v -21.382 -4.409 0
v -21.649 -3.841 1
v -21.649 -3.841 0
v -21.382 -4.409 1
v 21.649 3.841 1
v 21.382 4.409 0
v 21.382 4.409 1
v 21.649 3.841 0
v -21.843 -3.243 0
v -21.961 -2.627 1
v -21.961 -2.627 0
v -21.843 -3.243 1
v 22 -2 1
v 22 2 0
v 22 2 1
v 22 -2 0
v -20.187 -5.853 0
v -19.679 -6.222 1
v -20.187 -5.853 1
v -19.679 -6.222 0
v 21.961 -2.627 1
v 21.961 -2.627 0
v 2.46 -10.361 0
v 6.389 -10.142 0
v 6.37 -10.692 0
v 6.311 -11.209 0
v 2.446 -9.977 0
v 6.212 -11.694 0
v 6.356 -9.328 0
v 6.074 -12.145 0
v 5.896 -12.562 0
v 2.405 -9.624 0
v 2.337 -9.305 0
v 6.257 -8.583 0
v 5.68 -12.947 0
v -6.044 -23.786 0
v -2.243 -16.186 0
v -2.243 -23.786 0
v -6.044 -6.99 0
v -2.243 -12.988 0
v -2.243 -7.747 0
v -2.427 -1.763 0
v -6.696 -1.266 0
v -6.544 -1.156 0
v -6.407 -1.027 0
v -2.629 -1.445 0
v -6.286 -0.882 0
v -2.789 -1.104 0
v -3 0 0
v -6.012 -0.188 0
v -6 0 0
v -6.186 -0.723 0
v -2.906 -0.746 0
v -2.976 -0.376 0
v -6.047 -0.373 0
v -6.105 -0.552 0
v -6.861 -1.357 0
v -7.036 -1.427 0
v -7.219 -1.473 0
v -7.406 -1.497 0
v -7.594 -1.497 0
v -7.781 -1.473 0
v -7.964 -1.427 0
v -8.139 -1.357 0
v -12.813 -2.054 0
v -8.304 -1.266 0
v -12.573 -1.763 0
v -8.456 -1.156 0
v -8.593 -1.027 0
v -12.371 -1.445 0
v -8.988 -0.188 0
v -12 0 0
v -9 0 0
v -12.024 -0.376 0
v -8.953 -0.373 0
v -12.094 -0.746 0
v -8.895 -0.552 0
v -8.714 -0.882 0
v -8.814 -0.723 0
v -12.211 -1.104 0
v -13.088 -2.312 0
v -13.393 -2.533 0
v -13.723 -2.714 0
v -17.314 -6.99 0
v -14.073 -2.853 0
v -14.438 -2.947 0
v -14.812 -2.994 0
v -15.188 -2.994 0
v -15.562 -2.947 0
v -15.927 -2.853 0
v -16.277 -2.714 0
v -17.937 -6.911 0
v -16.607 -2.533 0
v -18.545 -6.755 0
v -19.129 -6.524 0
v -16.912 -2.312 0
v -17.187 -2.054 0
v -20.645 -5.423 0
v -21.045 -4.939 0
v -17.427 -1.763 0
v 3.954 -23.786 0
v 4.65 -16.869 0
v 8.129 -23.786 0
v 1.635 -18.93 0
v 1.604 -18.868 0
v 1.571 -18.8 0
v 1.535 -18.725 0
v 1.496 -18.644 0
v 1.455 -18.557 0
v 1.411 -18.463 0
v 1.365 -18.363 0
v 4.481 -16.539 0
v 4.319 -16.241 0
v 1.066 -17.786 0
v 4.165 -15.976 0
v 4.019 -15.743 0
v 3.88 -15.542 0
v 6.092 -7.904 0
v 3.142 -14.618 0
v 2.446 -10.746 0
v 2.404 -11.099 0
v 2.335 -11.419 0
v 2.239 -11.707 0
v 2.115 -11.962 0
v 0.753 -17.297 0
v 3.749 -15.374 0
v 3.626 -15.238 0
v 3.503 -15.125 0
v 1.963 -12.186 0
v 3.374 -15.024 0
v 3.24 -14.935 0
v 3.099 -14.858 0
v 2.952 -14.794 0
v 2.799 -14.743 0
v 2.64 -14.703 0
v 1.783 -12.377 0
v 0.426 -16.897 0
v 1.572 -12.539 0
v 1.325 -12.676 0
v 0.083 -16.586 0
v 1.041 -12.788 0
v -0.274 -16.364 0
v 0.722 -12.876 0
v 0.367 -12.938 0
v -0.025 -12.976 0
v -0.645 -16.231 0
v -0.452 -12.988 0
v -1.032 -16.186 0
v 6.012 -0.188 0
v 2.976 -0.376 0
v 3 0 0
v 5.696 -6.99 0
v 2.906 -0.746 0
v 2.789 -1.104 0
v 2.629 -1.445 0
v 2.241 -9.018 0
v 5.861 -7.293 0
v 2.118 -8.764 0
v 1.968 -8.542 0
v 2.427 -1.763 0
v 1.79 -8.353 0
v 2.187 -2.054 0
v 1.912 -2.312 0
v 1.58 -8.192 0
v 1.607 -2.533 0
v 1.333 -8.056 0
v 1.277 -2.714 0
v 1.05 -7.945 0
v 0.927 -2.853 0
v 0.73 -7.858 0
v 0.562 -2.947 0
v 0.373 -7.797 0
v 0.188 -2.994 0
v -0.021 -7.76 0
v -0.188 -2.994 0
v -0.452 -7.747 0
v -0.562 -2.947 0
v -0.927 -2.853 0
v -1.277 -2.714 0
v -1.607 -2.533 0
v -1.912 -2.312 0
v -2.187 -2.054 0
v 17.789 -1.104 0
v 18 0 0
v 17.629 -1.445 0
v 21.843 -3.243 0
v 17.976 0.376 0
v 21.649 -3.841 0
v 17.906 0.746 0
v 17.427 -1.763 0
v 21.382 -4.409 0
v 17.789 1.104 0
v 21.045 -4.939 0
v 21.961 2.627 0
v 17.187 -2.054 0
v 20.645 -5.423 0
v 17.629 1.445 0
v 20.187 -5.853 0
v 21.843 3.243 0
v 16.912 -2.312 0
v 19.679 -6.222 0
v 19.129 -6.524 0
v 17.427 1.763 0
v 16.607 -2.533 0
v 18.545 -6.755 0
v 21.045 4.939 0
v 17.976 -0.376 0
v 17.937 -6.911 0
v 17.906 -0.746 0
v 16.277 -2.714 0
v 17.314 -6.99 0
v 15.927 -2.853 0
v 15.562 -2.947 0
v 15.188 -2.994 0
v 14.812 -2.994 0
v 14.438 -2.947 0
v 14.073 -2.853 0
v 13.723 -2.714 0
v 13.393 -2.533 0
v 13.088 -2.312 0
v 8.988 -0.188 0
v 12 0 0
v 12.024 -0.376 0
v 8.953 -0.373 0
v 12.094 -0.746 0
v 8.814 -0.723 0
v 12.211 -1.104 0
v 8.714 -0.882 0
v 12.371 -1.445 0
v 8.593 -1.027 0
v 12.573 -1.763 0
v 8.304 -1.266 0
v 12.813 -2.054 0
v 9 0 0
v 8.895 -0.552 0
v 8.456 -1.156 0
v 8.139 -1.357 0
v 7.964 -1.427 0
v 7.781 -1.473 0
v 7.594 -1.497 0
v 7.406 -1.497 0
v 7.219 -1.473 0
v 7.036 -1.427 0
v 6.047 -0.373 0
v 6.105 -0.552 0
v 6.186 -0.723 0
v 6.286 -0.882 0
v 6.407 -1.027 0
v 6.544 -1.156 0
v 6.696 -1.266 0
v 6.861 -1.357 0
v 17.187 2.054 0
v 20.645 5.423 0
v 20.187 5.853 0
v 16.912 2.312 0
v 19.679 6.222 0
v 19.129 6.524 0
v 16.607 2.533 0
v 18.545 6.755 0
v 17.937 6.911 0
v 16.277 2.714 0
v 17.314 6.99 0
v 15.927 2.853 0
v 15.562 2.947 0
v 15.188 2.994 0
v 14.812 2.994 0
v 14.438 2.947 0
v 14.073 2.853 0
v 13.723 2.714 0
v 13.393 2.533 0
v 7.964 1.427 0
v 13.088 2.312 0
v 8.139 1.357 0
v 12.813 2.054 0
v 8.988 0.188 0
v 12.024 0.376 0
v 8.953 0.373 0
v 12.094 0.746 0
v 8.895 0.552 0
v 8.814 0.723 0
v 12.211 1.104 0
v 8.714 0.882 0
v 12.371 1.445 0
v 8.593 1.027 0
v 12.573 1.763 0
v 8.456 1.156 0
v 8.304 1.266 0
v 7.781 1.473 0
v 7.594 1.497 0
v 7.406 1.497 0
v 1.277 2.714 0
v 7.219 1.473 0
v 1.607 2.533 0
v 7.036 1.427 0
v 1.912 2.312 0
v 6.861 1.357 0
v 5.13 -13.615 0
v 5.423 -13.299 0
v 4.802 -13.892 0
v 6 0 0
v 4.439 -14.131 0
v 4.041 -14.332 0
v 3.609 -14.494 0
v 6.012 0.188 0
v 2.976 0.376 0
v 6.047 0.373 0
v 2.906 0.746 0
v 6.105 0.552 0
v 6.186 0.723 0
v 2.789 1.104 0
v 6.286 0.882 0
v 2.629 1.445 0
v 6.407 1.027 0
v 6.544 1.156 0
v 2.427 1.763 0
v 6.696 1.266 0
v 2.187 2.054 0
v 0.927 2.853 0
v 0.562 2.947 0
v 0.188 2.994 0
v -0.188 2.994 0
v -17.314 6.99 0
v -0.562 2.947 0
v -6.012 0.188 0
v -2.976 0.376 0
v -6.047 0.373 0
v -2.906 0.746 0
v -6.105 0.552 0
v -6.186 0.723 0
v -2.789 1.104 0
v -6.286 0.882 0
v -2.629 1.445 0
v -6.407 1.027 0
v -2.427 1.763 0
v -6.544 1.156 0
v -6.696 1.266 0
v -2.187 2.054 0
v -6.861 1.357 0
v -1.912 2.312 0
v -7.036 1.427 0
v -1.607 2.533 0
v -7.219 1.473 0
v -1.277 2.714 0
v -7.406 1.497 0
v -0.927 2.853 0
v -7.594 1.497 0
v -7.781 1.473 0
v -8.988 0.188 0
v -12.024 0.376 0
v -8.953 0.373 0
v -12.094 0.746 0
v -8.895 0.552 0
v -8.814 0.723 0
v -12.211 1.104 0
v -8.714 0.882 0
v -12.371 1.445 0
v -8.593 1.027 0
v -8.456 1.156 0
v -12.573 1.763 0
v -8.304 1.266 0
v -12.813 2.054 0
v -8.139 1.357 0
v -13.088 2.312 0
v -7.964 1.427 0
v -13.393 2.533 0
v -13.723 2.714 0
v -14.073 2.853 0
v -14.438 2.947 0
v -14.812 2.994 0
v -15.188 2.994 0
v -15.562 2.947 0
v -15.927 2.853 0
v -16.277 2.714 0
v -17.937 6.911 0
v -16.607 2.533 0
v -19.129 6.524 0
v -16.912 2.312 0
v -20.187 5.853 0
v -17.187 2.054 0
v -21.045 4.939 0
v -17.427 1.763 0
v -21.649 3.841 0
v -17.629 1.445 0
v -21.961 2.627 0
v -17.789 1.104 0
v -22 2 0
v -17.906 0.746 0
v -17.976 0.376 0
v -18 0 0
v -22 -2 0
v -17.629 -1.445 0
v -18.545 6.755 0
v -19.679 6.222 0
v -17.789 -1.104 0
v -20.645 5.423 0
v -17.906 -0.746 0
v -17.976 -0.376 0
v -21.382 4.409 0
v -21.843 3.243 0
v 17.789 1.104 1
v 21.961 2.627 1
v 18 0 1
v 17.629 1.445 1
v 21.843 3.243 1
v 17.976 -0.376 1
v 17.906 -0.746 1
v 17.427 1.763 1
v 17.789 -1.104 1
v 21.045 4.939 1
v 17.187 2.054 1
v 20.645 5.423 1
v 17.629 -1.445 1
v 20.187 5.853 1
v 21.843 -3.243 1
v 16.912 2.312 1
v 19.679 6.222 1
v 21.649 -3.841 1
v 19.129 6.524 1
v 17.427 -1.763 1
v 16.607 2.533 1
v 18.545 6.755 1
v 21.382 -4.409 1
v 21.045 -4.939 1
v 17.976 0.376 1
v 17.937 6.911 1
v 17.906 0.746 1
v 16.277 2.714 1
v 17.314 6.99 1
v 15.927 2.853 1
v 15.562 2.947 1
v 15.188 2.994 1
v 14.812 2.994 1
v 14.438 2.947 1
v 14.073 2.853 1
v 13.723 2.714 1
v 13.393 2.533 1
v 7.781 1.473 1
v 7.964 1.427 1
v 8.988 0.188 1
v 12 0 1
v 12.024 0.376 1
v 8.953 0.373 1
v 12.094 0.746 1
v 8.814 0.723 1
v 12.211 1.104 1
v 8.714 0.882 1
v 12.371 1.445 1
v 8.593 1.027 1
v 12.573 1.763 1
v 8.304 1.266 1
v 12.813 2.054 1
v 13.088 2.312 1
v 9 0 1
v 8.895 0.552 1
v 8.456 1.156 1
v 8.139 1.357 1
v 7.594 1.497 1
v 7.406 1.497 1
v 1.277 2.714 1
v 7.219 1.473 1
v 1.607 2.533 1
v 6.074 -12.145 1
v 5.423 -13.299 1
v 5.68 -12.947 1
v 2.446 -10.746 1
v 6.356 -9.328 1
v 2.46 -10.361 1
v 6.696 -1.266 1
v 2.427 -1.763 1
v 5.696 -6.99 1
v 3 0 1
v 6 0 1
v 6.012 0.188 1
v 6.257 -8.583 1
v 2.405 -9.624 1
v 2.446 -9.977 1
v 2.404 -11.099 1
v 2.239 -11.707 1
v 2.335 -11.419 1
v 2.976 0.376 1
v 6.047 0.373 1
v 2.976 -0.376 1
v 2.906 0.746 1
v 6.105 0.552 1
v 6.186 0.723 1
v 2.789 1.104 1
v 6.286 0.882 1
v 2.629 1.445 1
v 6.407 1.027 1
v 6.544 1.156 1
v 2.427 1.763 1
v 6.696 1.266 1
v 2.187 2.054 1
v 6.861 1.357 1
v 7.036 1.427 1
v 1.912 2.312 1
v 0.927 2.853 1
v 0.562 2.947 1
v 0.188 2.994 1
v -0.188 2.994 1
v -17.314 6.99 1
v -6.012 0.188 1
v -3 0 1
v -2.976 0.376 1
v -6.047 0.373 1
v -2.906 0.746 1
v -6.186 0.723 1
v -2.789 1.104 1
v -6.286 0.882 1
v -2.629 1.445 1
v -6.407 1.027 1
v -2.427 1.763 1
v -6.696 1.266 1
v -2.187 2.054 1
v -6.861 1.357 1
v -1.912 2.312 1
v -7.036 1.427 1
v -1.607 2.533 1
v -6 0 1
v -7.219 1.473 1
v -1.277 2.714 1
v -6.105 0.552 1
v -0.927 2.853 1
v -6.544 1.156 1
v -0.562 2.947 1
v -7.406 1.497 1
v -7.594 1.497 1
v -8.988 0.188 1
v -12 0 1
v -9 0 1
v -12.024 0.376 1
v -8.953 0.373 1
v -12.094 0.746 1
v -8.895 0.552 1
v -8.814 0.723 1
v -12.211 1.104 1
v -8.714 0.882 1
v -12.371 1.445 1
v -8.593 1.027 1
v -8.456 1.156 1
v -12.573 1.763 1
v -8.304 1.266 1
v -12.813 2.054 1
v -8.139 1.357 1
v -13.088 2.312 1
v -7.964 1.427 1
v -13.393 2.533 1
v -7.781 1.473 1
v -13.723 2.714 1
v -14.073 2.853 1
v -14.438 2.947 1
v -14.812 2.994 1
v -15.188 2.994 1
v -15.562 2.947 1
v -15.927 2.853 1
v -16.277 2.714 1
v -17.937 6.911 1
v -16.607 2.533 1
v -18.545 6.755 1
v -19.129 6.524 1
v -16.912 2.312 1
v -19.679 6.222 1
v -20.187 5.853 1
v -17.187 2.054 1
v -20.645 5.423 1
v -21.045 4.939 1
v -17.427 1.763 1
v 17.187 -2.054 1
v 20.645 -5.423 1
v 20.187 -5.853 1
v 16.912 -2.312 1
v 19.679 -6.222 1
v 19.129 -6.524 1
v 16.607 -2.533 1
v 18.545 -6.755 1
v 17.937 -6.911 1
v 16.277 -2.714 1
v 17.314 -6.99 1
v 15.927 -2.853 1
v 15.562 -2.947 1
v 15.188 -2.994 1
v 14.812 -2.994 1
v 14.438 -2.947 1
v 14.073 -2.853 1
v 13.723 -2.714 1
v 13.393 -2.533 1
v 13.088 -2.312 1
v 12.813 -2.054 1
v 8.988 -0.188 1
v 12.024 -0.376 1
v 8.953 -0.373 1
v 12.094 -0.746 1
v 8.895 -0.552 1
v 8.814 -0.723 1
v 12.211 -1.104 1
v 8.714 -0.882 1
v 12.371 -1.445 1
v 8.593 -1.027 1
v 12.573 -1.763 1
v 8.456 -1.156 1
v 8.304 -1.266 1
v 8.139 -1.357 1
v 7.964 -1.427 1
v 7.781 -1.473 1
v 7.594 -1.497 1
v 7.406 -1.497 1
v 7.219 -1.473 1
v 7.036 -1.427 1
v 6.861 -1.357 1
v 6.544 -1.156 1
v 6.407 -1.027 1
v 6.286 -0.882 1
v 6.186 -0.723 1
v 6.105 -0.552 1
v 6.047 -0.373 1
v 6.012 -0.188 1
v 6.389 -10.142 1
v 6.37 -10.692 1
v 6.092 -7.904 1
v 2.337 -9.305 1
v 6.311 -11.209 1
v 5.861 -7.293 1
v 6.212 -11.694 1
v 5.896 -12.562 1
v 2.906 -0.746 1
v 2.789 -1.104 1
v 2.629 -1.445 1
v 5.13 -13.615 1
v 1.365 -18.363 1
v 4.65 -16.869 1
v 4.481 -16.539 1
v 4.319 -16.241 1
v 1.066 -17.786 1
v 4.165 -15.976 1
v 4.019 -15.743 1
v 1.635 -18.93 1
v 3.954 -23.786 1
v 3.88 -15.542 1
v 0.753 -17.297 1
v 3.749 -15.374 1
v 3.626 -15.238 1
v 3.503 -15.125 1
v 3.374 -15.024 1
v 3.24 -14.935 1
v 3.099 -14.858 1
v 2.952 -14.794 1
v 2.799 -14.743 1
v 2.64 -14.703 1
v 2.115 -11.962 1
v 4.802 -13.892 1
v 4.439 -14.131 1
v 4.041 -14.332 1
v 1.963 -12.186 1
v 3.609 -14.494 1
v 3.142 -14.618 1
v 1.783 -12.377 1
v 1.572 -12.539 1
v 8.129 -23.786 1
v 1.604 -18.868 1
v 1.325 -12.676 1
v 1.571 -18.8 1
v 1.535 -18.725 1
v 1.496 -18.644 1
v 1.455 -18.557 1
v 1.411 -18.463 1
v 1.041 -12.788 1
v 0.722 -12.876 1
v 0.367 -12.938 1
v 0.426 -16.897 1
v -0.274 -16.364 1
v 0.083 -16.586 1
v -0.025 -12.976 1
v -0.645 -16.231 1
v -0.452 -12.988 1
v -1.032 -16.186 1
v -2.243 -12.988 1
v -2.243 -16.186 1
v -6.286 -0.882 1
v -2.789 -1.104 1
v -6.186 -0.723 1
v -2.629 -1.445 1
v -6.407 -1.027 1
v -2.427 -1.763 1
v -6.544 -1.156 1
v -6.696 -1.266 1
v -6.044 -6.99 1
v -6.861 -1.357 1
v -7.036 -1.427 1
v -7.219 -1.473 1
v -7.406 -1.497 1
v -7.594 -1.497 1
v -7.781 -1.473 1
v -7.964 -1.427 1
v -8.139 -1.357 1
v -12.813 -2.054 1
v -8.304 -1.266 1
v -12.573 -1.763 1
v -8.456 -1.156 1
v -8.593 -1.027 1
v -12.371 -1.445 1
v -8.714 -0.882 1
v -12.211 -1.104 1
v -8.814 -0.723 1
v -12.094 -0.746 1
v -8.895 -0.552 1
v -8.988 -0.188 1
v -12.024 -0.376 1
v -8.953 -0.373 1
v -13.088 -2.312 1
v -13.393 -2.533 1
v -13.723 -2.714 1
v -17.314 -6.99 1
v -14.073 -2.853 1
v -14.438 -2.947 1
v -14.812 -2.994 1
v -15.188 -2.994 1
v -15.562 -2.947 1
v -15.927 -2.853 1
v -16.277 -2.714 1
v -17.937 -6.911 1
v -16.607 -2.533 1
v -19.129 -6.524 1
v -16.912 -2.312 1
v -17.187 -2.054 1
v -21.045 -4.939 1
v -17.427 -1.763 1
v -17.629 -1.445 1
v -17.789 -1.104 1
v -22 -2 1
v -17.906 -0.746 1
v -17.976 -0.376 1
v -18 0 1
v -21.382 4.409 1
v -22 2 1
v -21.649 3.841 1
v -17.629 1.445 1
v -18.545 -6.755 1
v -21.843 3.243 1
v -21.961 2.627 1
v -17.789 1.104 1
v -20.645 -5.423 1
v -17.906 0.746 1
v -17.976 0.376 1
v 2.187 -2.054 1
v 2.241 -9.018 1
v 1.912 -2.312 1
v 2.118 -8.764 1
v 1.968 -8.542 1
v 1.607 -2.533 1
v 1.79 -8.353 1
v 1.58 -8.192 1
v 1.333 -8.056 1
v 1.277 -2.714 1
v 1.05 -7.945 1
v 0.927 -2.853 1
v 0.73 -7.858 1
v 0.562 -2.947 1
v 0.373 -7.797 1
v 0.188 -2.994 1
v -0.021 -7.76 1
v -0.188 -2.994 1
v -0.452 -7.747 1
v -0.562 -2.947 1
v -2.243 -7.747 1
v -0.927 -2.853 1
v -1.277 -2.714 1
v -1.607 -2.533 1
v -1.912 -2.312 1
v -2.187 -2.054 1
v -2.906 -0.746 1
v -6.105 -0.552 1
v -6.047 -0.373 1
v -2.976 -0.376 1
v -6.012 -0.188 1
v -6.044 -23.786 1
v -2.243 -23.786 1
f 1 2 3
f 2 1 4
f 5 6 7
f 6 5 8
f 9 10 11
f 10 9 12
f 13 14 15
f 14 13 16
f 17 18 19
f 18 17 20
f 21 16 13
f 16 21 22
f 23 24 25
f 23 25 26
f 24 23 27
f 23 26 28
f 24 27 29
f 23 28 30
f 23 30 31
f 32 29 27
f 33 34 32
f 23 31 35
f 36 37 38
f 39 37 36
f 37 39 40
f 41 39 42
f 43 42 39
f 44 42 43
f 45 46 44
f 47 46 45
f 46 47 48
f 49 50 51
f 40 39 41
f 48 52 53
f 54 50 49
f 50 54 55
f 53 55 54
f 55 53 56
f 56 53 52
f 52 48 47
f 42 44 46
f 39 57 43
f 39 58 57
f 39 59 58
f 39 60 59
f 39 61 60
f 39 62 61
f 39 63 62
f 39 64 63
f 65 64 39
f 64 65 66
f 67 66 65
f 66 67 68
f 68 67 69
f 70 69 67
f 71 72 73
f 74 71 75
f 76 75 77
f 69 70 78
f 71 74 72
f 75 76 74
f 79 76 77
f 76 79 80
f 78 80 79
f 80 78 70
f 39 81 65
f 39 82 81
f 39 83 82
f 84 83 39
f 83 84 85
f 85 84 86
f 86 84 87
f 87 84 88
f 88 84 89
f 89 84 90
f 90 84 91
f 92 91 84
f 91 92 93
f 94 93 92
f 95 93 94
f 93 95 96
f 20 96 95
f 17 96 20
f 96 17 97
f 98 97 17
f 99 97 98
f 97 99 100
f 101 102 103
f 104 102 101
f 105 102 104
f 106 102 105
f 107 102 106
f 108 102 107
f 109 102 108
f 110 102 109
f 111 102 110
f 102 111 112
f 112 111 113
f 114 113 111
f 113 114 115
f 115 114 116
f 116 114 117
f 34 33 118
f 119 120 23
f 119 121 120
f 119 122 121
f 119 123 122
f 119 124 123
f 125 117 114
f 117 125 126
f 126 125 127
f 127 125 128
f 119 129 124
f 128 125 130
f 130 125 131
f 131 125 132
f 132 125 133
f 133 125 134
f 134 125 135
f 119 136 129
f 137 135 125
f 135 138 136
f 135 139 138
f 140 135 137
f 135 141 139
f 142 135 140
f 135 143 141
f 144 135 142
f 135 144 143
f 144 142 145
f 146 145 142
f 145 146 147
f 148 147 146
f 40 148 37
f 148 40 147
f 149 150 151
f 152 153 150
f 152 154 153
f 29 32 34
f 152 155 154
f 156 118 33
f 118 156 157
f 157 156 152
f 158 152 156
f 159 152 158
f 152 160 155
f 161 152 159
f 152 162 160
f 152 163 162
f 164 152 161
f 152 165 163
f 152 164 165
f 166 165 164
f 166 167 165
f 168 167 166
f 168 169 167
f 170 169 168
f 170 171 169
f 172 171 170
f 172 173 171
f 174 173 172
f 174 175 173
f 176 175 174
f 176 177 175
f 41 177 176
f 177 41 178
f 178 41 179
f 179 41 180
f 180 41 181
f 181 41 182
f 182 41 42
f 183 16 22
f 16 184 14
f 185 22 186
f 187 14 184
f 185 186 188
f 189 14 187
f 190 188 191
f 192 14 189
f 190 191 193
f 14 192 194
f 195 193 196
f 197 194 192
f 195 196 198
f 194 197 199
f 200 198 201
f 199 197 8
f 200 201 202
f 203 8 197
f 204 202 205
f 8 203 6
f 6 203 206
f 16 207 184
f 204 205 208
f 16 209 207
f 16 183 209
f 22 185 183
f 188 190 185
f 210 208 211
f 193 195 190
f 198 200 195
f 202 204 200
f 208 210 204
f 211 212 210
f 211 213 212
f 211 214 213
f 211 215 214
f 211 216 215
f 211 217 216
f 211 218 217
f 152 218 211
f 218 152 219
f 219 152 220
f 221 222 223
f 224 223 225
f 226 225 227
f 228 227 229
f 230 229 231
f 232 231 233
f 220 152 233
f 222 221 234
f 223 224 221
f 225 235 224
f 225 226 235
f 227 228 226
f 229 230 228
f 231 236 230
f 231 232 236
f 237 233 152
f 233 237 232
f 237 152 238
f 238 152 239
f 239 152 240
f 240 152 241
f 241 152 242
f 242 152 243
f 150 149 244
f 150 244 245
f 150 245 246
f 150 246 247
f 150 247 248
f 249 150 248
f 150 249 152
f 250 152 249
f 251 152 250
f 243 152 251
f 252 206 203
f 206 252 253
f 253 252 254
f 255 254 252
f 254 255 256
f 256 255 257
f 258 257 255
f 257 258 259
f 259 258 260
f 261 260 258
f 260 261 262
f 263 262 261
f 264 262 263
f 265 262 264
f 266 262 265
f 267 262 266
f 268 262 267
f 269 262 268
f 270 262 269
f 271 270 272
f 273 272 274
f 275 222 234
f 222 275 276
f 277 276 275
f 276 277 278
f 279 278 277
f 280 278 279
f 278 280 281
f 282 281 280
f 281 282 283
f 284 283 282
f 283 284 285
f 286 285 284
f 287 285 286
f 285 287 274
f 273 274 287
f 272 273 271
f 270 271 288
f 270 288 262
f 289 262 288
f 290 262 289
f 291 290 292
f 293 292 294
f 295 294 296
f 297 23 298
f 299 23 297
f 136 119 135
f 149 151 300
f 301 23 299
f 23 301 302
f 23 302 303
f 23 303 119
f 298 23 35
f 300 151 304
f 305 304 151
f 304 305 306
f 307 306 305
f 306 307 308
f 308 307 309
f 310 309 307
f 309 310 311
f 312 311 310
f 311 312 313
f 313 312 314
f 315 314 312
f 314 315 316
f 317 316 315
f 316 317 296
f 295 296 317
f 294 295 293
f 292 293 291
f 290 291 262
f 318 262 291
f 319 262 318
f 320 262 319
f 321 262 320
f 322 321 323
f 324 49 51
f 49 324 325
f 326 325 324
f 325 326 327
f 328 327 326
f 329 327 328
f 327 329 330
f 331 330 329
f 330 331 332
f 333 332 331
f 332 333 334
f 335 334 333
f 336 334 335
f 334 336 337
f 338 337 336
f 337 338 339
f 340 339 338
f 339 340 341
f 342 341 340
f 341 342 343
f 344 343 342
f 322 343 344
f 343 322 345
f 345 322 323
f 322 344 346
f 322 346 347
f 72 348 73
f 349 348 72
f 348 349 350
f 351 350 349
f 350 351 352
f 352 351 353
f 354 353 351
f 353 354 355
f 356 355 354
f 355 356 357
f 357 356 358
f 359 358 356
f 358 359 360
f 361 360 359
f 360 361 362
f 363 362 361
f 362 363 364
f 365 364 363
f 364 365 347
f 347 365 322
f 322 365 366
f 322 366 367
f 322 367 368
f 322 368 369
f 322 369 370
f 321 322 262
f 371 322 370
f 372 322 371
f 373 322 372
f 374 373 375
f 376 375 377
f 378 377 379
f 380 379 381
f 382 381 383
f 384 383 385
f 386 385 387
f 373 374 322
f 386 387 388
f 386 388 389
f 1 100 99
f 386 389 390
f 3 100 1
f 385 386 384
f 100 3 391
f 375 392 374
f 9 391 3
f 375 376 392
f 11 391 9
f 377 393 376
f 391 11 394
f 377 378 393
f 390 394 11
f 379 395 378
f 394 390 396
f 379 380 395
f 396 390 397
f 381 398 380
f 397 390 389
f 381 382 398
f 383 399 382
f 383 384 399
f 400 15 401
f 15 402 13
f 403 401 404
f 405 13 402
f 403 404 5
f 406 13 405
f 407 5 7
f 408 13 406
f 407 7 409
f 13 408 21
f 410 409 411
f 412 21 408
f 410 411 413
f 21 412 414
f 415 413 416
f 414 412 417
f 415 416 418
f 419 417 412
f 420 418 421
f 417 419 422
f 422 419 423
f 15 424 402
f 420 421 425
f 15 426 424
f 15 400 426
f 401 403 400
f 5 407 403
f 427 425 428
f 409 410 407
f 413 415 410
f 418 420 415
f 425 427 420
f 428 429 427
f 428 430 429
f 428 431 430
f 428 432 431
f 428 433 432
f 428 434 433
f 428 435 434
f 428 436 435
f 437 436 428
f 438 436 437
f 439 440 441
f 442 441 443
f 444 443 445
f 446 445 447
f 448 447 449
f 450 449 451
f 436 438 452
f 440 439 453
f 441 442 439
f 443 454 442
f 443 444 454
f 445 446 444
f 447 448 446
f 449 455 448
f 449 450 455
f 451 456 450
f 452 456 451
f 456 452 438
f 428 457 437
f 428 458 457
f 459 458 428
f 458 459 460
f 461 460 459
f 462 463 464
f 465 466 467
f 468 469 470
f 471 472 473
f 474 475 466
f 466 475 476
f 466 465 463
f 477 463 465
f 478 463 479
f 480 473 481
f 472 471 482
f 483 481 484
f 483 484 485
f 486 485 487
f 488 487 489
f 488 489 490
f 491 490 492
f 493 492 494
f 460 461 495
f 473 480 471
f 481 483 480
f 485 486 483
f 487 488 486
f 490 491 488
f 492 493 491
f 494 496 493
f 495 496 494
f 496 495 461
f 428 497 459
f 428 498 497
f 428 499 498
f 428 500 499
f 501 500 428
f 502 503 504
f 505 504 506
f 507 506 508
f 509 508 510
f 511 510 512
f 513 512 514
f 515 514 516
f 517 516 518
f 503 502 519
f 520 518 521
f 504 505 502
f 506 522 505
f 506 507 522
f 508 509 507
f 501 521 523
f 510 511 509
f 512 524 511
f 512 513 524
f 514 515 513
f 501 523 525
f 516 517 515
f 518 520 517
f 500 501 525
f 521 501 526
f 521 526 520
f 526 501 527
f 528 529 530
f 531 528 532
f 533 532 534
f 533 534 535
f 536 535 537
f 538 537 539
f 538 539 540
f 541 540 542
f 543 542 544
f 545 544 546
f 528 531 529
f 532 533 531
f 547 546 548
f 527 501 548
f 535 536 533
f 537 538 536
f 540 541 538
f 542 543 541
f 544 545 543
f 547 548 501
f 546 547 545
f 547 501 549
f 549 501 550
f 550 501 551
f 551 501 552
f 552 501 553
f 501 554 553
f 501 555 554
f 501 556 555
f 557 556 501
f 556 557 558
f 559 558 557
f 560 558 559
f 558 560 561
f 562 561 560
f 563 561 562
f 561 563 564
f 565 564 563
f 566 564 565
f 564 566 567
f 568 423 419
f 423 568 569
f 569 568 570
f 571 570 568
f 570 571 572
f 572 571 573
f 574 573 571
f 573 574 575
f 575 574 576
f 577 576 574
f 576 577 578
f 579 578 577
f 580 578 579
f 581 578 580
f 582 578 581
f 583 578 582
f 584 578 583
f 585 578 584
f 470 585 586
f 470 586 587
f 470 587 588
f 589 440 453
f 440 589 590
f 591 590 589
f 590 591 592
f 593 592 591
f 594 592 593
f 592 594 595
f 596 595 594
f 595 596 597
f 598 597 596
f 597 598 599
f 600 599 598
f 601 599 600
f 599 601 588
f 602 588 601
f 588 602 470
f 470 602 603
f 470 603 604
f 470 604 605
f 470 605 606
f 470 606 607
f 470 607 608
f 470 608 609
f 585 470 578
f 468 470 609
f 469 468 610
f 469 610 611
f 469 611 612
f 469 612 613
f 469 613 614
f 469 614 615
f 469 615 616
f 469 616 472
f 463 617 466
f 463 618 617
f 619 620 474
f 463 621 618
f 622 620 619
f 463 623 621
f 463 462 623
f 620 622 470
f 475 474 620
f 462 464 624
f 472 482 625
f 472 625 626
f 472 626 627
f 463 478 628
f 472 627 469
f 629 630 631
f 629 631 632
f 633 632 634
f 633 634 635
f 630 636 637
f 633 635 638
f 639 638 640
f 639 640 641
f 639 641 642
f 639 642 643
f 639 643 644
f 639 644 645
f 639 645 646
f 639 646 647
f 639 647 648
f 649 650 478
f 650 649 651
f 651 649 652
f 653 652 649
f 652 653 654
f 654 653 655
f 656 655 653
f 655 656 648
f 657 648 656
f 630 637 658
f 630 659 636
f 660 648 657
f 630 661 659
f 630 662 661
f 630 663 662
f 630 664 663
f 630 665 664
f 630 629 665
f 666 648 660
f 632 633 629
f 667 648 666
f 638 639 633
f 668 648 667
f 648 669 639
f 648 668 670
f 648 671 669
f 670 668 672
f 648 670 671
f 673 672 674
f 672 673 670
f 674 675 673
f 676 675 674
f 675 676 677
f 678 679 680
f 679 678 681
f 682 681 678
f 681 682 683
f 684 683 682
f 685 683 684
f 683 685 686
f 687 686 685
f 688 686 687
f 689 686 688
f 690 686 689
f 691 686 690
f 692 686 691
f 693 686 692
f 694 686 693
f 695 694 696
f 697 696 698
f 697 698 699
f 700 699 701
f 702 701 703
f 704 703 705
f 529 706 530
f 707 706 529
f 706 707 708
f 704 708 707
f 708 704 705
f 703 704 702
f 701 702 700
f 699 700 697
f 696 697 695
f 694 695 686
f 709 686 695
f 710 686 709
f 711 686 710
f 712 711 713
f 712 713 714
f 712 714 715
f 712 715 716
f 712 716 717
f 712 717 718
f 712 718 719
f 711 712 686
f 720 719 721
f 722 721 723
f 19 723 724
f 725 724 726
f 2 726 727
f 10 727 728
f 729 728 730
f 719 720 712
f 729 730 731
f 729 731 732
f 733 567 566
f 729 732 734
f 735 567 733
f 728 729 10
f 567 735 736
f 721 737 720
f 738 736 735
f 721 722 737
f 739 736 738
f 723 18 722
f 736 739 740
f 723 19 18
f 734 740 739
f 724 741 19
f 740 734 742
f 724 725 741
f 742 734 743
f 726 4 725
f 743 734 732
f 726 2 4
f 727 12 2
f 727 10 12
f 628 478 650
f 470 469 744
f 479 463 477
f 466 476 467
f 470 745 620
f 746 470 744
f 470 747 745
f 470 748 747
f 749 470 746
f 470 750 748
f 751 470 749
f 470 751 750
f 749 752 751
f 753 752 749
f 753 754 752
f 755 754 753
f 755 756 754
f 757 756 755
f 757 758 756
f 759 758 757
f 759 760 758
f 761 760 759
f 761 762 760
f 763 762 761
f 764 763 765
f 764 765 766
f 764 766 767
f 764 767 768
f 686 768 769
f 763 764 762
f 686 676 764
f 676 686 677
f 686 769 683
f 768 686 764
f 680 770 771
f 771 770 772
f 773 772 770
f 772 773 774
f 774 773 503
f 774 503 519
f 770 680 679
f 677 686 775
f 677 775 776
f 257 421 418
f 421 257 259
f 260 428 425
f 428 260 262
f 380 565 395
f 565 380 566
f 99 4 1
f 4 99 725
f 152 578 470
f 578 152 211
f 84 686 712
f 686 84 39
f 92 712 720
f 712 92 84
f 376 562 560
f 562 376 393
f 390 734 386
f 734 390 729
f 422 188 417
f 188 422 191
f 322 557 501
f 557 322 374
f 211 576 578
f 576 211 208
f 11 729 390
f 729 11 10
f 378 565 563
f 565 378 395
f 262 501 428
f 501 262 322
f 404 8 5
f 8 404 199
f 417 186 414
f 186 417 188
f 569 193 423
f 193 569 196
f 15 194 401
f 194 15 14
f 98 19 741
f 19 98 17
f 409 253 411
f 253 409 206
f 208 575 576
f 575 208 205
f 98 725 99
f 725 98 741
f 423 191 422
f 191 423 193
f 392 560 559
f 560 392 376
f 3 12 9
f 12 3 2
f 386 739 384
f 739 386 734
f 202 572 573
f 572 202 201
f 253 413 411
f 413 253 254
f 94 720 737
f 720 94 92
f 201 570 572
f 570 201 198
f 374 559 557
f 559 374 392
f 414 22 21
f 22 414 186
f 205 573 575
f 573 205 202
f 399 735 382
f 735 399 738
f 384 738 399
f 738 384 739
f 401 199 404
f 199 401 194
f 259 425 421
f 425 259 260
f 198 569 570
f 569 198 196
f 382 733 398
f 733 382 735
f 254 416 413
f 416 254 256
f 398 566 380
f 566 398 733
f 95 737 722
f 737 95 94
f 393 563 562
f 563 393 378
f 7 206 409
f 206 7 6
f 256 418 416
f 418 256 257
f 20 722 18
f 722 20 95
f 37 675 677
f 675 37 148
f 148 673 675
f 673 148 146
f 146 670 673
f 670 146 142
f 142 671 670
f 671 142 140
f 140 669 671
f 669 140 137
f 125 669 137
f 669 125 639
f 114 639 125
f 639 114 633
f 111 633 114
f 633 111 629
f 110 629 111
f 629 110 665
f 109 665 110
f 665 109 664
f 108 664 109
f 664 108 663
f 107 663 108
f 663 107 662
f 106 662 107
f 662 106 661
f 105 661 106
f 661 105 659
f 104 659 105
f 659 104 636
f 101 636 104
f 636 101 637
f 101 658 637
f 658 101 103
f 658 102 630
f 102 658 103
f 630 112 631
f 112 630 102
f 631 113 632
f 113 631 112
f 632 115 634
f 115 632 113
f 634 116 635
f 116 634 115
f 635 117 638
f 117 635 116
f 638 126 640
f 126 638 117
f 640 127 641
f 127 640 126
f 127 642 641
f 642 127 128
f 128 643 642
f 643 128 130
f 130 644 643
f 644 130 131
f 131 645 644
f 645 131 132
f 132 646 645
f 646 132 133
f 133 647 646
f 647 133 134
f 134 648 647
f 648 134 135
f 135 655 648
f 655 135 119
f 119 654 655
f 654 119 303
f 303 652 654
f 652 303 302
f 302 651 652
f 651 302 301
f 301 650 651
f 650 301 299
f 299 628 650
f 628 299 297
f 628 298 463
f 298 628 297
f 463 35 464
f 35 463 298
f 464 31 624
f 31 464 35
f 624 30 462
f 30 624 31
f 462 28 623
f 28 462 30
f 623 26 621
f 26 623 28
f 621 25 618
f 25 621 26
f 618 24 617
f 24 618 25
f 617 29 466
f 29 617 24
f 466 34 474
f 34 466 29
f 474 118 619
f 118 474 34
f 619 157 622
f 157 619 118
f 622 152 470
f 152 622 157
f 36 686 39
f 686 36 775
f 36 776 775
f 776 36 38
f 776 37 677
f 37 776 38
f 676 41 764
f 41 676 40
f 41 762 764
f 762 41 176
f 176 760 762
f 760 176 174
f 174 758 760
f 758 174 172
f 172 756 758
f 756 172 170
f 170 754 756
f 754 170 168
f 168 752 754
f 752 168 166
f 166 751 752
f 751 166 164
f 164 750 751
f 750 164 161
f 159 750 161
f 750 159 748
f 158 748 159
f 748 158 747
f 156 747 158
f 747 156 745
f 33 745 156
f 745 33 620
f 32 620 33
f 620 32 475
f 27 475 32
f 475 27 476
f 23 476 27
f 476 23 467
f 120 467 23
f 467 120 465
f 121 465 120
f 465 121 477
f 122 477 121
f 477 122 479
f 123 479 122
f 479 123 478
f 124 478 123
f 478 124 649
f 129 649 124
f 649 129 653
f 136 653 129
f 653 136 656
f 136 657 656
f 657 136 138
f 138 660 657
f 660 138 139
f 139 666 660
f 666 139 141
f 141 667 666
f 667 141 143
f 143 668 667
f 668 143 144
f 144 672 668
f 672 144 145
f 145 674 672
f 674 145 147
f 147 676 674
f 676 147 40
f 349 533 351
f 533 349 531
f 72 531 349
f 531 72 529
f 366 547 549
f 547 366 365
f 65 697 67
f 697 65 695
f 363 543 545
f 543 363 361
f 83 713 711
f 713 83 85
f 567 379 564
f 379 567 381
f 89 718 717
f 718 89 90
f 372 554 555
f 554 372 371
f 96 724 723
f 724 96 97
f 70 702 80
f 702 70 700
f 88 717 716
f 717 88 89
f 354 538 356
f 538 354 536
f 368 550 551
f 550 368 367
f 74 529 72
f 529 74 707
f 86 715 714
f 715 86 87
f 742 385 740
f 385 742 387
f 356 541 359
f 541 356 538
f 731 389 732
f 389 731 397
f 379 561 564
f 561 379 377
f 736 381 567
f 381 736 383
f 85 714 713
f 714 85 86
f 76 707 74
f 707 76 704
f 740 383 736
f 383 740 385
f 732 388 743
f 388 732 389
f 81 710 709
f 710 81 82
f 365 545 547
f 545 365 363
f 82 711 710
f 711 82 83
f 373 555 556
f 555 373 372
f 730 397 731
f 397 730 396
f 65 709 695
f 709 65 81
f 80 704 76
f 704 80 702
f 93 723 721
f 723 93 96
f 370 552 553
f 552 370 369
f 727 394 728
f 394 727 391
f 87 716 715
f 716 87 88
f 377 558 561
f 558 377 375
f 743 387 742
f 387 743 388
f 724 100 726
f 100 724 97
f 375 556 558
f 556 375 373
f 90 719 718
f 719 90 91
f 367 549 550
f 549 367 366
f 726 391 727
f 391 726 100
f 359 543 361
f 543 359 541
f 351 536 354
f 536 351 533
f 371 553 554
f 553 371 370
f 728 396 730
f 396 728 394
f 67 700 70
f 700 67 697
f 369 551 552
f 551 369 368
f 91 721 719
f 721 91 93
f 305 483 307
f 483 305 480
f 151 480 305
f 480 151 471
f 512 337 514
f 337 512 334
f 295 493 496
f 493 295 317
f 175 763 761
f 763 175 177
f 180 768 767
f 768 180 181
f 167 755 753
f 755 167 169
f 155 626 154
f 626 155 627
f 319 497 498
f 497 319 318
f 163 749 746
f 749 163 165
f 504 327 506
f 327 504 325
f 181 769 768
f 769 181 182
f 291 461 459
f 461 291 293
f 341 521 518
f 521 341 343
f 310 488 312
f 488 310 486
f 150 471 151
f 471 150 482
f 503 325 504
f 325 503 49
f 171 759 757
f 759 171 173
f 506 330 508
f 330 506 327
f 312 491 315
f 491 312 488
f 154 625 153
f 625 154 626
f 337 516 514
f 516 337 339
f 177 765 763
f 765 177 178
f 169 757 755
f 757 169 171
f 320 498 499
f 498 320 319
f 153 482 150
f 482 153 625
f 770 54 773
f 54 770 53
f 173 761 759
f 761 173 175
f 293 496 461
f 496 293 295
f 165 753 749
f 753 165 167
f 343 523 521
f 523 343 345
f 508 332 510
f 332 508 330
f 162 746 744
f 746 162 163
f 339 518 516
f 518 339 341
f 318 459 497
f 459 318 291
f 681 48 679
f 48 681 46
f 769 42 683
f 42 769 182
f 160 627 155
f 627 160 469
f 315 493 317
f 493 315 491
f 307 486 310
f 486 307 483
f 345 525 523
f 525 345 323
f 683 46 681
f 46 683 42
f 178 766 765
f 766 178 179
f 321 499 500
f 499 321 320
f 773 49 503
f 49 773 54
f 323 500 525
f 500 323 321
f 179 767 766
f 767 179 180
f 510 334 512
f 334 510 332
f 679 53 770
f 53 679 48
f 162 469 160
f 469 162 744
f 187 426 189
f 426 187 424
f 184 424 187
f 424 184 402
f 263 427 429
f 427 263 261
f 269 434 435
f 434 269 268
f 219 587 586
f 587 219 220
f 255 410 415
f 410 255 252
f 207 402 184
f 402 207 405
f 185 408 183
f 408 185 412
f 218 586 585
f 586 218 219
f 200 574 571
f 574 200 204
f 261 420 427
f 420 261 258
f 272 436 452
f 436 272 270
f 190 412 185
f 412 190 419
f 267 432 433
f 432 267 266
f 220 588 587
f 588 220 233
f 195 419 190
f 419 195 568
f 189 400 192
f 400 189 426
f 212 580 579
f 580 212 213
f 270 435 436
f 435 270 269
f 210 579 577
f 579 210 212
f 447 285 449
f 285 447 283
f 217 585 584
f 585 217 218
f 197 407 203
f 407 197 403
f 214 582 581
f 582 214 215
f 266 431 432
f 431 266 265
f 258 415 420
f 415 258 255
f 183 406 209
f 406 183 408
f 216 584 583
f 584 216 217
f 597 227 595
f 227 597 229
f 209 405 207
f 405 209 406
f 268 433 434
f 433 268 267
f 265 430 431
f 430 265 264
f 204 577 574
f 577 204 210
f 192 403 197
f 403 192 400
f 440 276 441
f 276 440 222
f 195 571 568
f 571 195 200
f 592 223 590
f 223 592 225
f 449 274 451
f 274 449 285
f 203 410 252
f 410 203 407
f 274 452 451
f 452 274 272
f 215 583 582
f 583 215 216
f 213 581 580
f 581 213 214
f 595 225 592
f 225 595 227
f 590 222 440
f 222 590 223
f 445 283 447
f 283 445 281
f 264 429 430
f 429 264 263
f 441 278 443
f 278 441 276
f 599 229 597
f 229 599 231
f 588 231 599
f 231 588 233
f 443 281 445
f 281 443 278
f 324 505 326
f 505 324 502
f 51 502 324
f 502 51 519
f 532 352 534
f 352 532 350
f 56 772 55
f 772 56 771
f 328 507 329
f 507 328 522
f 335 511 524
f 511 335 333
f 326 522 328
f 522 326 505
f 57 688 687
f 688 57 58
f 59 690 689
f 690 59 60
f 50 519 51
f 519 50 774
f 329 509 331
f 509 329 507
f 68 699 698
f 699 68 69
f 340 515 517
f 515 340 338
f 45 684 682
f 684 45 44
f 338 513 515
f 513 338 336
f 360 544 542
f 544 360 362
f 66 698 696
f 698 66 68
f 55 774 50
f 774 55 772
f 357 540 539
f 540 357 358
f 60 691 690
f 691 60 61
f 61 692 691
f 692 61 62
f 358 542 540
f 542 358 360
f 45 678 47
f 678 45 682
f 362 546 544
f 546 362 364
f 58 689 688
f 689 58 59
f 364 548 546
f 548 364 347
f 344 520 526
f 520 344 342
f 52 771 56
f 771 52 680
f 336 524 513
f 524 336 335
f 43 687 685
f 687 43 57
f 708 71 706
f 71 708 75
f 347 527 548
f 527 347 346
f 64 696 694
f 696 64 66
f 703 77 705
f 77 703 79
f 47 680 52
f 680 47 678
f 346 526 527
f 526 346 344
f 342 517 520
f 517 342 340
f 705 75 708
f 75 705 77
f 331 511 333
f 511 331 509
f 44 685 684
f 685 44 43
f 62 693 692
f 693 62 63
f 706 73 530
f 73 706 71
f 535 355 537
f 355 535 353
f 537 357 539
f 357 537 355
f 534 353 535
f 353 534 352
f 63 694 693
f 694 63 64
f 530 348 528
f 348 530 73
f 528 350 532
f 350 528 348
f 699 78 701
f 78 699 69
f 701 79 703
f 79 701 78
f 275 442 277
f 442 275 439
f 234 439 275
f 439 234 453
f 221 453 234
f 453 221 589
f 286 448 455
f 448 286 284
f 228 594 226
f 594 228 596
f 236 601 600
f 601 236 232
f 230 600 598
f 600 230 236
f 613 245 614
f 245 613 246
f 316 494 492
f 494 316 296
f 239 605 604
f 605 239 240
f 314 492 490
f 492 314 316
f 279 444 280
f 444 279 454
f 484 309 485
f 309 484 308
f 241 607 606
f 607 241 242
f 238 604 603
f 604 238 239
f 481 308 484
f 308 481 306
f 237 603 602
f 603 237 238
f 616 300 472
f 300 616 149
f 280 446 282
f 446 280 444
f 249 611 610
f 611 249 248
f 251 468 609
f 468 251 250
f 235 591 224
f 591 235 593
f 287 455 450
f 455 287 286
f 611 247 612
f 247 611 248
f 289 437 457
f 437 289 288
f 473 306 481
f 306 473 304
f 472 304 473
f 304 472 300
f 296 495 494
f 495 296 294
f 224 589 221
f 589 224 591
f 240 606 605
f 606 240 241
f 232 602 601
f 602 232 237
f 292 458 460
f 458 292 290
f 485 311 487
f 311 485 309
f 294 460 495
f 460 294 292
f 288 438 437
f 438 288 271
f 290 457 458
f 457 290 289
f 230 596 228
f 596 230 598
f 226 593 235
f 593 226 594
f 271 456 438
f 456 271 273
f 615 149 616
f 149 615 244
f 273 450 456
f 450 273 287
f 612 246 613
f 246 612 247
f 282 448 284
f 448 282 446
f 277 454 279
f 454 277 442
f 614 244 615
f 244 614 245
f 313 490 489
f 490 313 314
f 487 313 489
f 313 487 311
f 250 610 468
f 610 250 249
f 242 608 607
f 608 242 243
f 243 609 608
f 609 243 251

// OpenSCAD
$fn = 50;


difference() {
	union() {
		hull() {
			translate(v = [-17.0000000000, 2.0000000000, 0]) {
				cylinder(h = 1, r = 5);
			}
			translate(v = [17.0000000000, 2.0000000000, 0]) {
				cylinder(h = 1, r = 5);
			}
			translate(v = [-17.0000000000, -2.0000000000, 0]) {
				cylinder(h = 1, r = 5);
			}
			translate(v = [17.0000000000, -2.0000000000, 0]) {
				cylinder(h = 1, r = 5);
			}
		}
		translate(v = [0, -5, 0]) {
			linear_extrude(height = 1) {
				text(font = "DejaVu Sans Mono:style=Bold", halign = "center", size = 19.0000000000, text = "R", valign = "top");
			}
		}
	}
	union() {
		translate(v = [-15.0000000000, 0.0000000000, 0]) {
			translate(v = [0, 0, -100]) {
				cylinder(h = 200, r = 3.0000000000);
			}
		}
		translate(v = [0, 0, -100]) {
			cylinder(h = 200, r = 3.0000000000);
		}
		translate(v = [15.0000000000, 0.0000000000, 0]) {
			translate(v = [0, 0, -100]) {
				cylinder(h = 200, r = 3.0000000000);
			}
		}
		translate(v = [-15.0000000000, 0.0000000000, 0]) {
			translate(v = [0, 0, -100]) {
				cylinder(h = 200, r = 1.5000000000);
			}
		}
		translate(v = [-7.5000000000, 0.0000000000, 0]) {
			translate(v = [0, 0, -100]) {
				cylinder(h = 200, r = 1.5000000000);
			}
		}
		translate(v = [0, 0, -100]) {
			cylinder(h = 200, r = 1.5000000000);
		}
		translate(v = [7.5000000000, 0.0000000000, 0]) {
			translate(v = [0, 0, -100]) {
				cylinder(h = 200, r = 1.5000000000);
			}
		}
		translate(v = [15.0000000000, 0.0000000000, 0]) {
			translate(v = [0, 0, -100]) {
				cylinder(h = 200, r = 1.5000000000);
			}
		}
	}
}
